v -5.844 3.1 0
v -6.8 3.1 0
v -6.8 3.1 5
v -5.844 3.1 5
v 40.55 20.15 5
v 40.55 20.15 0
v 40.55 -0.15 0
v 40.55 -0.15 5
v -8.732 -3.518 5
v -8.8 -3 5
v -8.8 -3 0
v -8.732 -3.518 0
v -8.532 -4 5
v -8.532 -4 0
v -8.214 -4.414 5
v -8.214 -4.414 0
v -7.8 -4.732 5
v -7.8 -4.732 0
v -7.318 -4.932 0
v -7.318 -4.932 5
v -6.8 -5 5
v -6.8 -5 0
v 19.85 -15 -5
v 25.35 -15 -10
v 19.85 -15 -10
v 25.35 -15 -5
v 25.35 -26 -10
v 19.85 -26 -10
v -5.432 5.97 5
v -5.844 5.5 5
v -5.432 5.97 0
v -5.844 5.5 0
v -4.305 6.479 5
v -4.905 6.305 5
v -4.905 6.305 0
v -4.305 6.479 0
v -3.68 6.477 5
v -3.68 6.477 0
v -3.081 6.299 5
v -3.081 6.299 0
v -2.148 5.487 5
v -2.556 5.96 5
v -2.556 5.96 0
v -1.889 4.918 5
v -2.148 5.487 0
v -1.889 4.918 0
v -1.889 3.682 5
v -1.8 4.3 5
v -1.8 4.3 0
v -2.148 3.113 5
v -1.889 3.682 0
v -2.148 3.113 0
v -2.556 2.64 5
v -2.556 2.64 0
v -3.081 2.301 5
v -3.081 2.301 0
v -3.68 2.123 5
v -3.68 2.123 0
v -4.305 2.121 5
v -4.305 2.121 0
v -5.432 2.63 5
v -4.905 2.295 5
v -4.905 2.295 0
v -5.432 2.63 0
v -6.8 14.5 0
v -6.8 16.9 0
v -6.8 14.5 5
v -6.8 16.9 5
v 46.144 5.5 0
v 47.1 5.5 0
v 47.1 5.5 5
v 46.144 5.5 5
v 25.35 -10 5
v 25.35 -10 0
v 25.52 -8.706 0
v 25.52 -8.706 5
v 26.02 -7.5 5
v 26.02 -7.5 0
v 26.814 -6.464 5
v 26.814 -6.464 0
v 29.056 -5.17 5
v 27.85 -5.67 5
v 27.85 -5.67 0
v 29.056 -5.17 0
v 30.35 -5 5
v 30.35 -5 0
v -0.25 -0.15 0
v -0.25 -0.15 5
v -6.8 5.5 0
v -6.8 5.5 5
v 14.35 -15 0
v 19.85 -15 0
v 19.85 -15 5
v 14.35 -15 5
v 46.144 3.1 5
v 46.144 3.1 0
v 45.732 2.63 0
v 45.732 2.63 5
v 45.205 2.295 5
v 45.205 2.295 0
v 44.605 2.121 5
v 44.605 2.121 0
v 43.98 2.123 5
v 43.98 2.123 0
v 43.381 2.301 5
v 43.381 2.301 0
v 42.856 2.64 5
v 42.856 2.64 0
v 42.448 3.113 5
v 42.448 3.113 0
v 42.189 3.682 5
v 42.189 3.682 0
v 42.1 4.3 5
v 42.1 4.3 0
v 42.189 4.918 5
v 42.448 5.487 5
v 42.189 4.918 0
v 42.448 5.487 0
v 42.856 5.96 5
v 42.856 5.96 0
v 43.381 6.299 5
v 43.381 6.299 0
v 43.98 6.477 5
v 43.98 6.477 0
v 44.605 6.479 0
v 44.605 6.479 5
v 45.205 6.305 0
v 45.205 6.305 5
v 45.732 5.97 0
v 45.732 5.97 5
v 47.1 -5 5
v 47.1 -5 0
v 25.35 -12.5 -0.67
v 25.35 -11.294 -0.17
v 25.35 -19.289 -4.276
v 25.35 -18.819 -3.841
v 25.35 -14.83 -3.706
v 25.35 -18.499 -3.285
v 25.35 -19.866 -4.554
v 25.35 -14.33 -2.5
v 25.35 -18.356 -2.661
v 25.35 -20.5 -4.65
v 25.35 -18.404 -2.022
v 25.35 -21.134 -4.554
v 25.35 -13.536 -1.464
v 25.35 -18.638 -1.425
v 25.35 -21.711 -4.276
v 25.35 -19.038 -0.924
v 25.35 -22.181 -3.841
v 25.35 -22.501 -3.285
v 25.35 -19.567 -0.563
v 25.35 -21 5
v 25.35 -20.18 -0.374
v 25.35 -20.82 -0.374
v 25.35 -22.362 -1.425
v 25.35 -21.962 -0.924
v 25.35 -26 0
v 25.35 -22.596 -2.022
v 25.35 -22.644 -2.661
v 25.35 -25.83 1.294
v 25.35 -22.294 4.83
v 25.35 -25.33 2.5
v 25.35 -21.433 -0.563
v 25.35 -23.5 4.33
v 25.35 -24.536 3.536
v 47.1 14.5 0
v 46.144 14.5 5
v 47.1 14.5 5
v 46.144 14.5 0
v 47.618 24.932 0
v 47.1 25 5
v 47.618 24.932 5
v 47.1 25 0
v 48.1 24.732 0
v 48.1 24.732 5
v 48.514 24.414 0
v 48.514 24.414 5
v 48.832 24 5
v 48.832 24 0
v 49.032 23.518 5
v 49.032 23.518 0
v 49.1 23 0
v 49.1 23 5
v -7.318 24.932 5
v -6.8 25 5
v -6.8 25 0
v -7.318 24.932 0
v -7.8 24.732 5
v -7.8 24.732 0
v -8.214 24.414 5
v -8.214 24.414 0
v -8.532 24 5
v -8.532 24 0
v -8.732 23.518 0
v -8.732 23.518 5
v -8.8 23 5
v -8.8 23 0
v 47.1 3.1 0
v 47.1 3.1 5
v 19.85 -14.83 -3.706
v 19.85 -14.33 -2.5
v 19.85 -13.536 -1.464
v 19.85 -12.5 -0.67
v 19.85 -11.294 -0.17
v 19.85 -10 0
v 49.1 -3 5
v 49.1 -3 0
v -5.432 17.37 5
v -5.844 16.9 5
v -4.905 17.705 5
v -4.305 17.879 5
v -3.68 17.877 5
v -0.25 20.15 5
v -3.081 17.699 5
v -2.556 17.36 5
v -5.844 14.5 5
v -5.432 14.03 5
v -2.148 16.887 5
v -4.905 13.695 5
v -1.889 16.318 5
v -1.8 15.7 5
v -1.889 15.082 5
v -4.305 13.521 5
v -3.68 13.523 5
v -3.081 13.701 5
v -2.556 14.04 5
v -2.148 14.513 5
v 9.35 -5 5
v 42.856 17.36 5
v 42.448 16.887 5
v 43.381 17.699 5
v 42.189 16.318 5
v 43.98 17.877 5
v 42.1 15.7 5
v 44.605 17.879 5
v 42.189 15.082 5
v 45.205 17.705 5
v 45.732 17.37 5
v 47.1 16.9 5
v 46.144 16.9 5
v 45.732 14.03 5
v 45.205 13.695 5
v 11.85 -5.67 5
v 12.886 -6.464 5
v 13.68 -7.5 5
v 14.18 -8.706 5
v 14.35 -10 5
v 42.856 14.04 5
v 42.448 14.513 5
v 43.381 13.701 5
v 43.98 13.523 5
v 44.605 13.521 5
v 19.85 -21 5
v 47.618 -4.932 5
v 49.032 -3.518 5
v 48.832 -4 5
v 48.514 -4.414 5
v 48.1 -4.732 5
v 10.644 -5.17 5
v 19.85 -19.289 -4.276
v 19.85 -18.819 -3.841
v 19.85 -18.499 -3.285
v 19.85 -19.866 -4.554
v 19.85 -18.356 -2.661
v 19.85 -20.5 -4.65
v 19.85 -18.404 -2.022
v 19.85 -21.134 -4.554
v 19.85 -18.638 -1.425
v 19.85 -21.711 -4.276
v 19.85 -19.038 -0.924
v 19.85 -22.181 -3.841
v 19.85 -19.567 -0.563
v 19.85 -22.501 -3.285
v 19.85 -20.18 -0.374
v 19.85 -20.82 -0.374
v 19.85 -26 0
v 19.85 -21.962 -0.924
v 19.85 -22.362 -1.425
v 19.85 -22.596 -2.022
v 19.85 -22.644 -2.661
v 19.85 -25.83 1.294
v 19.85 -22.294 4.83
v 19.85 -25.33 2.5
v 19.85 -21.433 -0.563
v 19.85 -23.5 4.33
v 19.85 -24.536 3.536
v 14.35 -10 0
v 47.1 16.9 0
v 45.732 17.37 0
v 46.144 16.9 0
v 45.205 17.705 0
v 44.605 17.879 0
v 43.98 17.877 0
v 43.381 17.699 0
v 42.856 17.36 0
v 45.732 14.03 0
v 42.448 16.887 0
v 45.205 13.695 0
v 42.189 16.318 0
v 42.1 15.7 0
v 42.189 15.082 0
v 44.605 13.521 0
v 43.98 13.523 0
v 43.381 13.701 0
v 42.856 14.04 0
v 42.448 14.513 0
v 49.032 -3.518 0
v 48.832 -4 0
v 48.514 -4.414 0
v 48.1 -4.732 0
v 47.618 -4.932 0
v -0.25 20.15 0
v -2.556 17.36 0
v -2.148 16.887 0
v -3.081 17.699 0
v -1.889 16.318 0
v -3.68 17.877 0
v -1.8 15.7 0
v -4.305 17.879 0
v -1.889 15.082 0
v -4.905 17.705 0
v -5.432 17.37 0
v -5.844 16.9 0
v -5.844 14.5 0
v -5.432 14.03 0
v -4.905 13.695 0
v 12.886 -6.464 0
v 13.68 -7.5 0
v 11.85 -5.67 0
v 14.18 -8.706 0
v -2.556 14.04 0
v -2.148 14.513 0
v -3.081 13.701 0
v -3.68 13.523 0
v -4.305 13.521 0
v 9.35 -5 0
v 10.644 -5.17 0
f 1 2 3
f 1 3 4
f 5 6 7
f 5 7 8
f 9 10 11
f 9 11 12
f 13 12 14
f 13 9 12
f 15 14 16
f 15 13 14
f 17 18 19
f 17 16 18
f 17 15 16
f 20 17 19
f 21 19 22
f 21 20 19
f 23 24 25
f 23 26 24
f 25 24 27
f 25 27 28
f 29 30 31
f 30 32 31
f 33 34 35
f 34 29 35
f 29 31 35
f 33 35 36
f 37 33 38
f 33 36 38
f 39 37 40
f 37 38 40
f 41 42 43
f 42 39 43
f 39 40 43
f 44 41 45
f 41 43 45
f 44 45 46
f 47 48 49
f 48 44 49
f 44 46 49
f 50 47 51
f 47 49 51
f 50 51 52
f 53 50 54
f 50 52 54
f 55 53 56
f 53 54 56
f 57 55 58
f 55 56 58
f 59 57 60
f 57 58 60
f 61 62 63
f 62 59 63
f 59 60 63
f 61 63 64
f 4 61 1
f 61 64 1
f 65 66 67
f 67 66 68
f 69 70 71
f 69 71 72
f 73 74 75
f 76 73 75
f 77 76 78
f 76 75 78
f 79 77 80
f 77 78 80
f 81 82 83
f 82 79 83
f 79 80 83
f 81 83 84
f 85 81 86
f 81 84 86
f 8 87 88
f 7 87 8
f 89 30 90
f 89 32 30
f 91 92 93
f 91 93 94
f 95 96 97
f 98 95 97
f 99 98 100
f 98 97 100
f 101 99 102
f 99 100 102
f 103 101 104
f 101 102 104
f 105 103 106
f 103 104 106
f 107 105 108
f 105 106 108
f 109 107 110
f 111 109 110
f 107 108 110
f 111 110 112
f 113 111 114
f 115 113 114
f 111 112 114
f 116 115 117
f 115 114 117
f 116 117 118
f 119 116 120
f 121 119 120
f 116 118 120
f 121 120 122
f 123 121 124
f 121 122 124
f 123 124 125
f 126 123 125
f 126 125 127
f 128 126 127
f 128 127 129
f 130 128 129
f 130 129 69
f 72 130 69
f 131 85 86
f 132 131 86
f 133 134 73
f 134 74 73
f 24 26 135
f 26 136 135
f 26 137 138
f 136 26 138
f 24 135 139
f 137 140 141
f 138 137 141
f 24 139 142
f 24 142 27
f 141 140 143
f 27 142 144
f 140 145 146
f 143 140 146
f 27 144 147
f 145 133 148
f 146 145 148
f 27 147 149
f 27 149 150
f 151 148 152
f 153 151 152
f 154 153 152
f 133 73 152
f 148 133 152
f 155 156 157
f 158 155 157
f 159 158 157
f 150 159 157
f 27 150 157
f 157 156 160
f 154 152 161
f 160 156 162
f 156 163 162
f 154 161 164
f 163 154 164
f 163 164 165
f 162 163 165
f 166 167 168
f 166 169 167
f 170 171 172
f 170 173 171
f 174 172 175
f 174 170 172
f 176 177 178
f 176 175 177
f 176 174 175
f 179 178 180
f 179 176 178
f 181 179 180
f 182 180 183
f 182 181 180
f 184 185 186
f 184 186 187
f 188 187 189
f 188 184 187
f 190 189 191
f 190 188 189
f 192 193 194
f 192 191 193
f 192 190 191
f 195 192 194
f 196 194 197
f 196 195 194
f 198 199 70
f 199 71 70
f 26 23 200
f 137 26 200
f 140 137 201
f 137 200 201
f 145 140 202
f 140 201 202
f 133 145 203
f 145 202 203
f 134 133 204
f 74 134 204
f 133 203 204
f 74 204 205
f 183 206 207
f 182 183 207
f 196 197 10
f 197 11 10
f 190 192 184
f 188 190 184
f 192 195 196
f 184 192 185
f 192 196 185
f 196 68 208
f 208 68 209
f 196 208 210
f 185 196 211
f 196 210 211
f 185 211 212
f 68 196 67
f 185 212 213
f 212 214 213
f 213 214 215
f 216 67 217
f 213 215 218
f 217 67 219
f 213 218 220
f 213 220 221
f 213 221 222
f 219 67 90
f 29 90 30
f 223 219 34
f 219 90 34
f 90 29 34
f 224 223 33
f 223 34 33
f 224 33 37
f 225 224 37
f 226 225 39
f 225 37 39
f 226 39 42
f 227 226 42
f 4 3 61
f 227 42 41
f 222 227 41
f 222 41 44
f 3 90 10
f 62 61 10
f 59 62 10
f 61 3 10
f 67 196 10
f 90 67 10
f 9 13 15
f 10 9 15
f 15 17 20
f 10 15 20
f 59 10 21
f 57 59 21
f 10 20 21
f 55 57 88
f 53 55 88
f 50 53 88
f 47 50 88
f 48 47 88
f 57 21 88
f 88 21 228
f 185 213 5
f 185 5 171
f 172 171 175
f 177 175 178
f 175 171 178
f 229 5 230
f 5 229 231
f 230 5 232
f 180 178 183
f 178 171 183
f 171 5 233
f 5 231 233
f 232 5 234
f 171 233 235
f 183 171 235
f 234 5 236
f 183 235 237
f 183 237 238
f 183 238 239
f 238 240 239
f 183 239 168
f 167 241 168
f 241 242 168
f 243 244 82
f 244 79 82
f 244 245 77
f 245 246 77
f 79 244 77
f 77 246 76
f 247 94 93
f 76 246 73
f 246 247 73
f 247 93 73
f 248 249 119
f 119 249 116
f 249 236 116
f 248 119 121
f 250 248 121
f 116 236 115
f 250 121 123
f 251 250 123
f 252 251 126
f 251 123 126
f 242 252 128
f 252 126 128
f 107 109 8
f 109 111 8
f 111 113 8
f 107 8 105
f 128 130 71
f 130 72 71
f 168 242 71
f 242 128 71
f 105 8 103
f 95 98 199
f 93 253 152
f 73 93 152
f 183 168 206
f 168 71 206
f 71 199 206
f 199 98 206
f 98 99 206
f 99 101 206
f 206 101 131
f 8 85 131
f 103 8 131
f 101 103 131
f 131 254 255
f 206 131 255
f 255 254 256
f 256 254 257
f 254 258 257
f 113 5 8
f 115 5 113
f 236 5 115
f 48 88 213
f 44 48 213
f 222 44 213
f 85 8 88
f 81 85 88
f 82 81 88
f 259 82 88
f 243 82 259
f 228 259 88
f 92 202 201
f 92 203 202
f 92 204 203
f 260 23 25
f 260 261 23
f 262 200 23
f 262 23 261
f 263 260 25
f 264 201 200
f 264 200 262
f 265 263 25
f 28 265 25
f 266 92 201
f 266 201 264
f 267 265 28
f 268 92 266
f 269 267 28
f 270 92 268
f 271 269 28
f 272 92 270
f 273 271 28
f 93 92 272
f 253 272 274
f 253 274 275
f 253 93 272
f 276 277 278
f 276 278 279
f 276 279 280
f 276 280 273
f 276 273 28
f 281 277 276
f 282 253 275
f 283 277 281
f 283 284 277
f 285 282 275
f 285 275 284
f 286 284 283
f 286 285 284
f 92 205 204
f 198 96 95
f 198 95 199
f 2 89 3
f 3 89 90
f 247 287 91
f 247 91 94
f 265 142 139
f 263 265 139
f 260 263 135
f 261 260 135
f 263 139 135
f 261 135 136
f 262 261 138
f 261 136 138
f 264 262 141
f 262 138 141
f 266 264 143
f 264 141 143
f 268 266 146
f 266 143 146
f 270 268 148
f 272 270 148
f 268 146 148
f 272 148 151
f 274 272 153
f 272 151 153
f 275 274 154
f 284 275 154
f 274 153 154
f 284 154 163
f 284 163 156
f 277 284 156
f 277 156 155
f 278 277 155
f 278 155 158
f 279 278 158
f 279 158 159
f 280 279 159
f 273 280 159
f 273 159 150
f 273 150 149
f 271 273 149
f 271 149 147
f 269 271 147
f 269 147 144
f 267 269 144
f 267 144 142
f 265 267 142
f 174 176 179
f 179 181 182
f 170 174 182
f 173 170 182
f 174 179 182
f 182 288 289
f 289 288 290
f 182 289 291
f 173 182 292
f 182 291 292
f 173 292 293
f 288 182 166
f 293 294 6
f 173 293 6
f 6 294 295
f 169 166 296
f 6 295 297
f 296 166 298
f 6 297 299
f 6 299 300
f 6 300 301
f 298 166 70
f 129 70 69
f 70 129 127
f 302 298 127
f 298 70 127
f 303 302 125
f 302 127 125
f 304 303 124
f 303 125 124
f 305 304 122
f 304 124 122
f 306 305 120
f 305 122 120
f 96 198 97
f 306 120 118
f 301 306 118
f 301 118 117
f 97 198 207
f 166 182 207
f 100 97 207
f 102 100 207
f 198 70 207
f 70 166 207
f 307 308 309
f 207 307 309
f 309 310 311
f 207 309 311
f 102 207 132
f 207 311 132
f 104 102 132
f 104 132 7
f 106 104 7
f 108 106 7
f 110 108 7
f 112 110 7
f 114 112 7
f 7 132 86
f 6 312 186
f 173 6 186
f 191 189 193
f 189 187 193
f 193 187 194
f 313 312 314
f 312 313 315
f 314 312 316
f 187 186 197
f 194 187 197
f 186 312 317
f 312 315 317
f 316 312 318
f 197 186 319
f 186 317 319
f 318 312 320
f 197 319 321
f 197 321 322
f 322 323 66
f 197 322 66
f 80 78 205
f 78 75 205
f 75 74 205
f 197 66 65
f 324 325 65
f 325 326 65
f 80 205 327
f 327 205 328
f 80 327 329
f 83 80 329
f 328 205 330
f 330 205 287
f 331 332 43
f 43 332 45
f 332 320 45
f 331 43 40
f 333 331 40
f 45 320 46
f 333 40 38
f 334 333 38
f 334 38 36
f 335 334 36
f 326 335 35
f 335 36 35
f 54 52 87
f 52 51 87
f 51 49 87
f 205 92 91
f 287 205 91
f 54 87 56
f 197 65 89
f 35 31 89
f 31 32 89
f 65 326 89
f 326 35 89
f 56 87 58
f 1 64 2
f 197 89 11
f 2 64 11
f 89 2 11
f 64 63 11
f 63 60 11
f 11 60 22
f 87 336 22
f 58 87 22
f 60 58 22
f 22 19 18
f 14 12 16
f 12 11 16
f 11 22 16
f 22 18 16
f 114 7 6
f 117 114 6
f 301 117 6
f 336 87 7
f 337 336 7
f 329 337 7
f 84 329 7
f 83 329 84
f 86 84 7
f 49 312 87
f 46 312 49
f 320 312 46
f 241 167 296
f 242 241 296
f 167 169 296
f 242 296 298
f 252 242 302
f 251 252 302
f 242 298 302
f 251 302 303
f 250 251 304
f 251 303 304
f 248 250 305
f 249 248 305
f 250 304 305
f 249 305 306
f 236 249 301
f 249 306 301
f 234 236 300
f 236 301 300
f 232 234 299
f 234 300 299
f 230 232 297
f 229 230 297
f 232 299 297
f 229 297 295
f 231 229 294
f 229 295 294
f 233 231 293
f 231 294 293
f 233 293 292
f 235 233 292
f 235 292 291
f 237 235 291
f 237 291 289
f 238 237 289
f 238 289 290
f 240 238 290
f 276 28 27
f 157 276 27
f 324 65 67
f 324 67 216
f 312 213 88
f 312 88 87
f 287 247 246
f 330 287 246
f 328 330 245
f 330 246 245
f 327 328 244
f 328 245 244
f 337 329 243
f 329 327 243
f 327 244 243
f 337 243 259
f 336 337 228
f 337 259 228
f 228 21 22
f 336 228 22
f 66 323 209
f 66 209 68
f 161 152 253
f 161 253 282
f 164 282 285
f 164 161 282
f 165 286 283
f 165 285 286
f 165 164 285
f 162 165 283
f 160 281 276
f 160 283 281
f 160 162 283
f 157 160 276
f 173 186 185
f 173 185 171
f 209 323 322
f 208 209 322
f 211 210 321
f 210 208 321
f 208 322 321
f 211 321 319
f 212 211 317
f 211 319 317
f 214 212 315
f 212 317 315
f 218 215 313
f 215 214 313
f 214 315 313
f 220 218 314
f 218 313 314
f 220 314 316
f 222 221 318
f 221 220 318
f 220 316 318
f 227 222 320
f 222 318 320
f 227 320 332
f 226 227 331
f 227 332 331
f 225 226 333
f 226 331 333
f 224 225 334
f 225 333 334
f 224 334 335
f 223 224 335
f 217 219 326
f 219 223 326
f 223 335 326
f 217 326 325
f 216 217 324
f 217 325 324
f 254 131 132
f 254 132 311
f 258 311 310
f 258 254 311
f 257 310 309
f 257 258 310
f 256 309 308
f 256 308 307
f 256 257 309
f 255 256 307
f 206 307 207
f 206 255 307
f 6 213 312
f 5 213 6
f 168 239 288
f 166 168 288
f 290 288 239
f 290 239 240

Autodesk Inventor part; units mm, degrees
ref_plane "YZ Plane" through (0, 0, 0) normal (1, 0, 0) x (0, 1, 0)
ref_plane "XZ Plane" through (0, 0, 0) normal (0, 1, 0) x (-1, 0, 0)
sketch "Sketch1" plane through (0, 0, 0) normal (0, 0, 1) x (1, 0, 0)
  line L0 (0, 0) -> (-6.8, 0)
  line L1 (-6.8, 0) -> (-6.8, 20)
  line L2 (-6.8, 20) -> (0, 20)
  line L3 (0, 20) -> (0, 0)
  line L4 (-5.8439, 5.5) -> (-6.8, 5.5) projected
  line L5 (-6.8, 14.5) -> (-6.8, 5.5) projected
  line L6 (-6.8, 14.5) -> (-5.8439, 14.5) projected
  arc A0 (-5.8439, 14.5) -> (-5.8439, 16.9) centre (-4, 15.7) ccw projected
  line L7 (-5.8439, 16.9) -> (-6.8, 16.9) projected
  line L8 (-6.8, 20) -> (-6.8, 16.9) projected
  line L9 (0, 20) -> (-6.8, 20) projected
  line L10 (0, 0) -> (0, 20) projected
  line L11 (0, 0) -> (-6.8, 0) projected
  line L12 (-6.8, 3.1) -> (-6.8, 0) projected
  line L13 (-6.8, 3.1) -> (-5.8439, 3.1) projected
  arc A1 (-5.8439, 3.1) -> (-5.8439, 5.5) centre (-4, 4.3) ccw projected
  dimension "d0" = 6.8
  dimension "d1" = 20
extrude "Extrusion1" add sketch "Sketch1" along normal blind 5 contours L0 L1 L13 A1 L4 L6 A0 L7 L2 L3
ref_plane "Work Plane1" through (20.15, 10, -1.65) normal (-1, 0, 0) x (0, 1, 0)
mirror "Mirror1" about plane through (20.15, 10, -1.65) normal (-1, 0, 0) of "Extrusion1"
sketch "Sketch2" plane through (-6.8, 0, 0) normal (0, -1, 0) x (1, 0, 0)
  line L0 (0, 0) -> (53.9, 0)
  line L1 (53.9, 0) -> (53.9, 5)
  line L2 (53.9, 5) -> (0, 5)
  line L3 (0, 5) -> (0, 0)
  dimension "d4" = 53.9
extrude "Extrusion2" add sketch "Sketch2" along normal blind 5
sketch "Sketch3" plane through (-6.8, 3.1, 0) normal (-1, 0, 0) x (0, 0, 1)
  line L0 (0, -8.1) -> (5, -8.1)
  line L1 (5, -8.1) -> (5, 16.9)
  line L2 (5, 16.9) -> (0, 16.9)
  line L3 (0, 16.9) -> (0, -8.1)
  point P0 (0, -3.1)
  dimension "d7" = 25
extrude "Extrusion3" add sketch "Sketch3" along normal blind 2
mirror "Mirror2" about plane through (20.15, 10, -1.65) normal (-1, 0, 0) of "Extrusion3"
fillet "Fillet1" radius 2 1 edges at (-8.8, -5, 2.5)
fillet "Fillet2" radius 2 1 edges at (49.1, -5, 2.5)
sketch "Sketch4" plane through (0, 20, 5) normal (1, 0, 0) x (0, 0, -1)
  line L0 (5, -20) -> (5, 0) projected
  line L1 (5, 0) -> (0, 0) projected
  line L2 (0, -20) -> (0, 0) projected
  line L3 (5, -20) -> (0, -20) projected
extrude "Extrusion4" cut sketch "Sketch4" against normal blind 0.25
mirror "Mirror3" about plane through (20.15, 10, -1.65) normal (-1, 0, 0) of "Extrusion4"
sketch "Sketch5" plane through (-8.8, 20, 5) normal (0, 1, 0) x (1, 0, 0)
  line L0 (0, 0) -> (57.9, 0)
  line L1 (57.9, 0) -> (57.9, 5)
  line L2 (57.9, 5) -> (0, 5)
  line L3 (0, 5) -> (0, 0)
  point P0 (8.8, 5)
  dimension "d14" = 57.9
extrude "Extrusion5" add sketch "Sketch5" along normal blind 5
sketch "Sketch6" plane through (-8.8, 20, 5) normal (0, -1, 0) x (1, 0, 0)
  line L0 (8.55, 0) -> (8.55, -5) projected
  line L1 (49.35, -5) -> (8.55, -5) projected
  line L2 (49.35, -5) -> (49.35, 0) projected
  line L3 (8.55, 0) -> (49.35, 0) projected
  point P0 (8.8, -5)
extrude "Extrusion6" cut sketch "Sketch6" against normal blind 0.15
sketch "Sketch7" plane through (-6.8, 0, 0) normal (0, 1, 0) x (1, 0, 0)
  line L0 (47.35, -5) -> (6.55, -5) projected
  line L1 (47.35, 0) -> (47.35, -5) projected
  line L2 (6.55, 0) -> (47.35, 0) projected
  line L3 (6.55, 0) -> (6.55, -5) projected
  point P0 (6.8, 0)
extrude "Extrusion7" cut sketch "Sketch7" against normal blind 0.15
sketch "Sketch9" plane through (-6.8, -5, 0) normal (0, -1, 0) x (1, 0, 0)
  line L0 (0, 5) -> (53.9, 5) projected
  line L1 (53.9, 0) -> (0, 0) projected
  line L2 (26.65, -10.0707) -> (26.65, 15.0707) construction
  line L3 (55.9, 0) -> (55.9, 5) construction
  line L4 (21.15, 5) -> (32.15, 5)
  line L5 (32.15, 5) -> (32.15, 0)
  line L6 (32.15, 0) -> (21.15, 0)
  line L7 (21.15, 0) -> (21.15, 5)
  point P0 (6.8, 0)
  dimension "d23" = 29.25
  dimension "d24" = 11
  dimension "d25" = 5.5
extrude "Extrusion9" add sketch "Sketch9" along normal blind 21
fillet "Fillet3" radius 5 2 edges at (14.35, -5, 2.5) (25.35, -5, 2.5)
sketch "Sketch10" plane through (0, 0, 0) normal (0, 0, -1) x (-1, 0, 0)
  line L0 (-47.1, -5) -> (-30.35, -5) projected
  line L1 (-14.35, -10) -> (-14.35, -26) projected
  line L2 (-25.35, -15) -> (-19.85, -15)
  line L3 (-19.85, -15) -> (-19.85, -26)
  line L4 (-19.85, -26) -> (-25.35, -26)
  line L5 (-25.35, -10) -> (-25.35, -26) projected
  line L6 (-9.35, -5) -> (6.8, -5) projected
  line L7 (-25.35, -15) -> (-25.35, -26)
  point P0 (0, 0)
  dimension "d30" = 11
  dimension "d31" = 10
  dimension "d32" = 5.5
extrude "Extrusion10" add sketch "Sketch10" along normal blind 10
fillet "Fillet7" radius 5 1 edges at (22.6, -15, 0)
sketch "Sketch11" plane through (0, 0, 0) normal (0, 0, -1) x (-1, 0, 0)
  line L0 (-19.85, -10) -> (-19.85, -26) projected
  line L1 (-14.35, -26) -> (-19.85, -26)
  line L2 (-19.85, -26) -> (-19.85, -15)
  line L3 (-19.85, -15) -> (-14.35, -15)
  line L4 (-14.35, -15) -> (-14.35, -26)
  point P0 (0, 0)
  dimension "d39" = 11
extrude "Extrusion11" cut sketch "Sketch11" against normal blind 10
sketch "Sketch12" plane through (25.35, -26, 5) normal (1, 0, 0) x (0, 0, -1)
  line L0 (15, 11) -> (15, 0) projected
  circle A0 centre (7.5, 5.5) radius 2.15
  point P0 (5, 26)
  dimension "d42" = 4.3
  dimension "d43" = 7.5
extrude "Extrusion12" cut sketch "Sketch12" against normal blind 10
fillet "Fillet8" radius 5 1 edges at (22.6, -26, 5)
sketch "Sketch14" plane through (20.15, 10, -1.65) normal (1, 0, 0) x (0, 1, 0)
  point P0 (-10, -1.65)
fillet "Fillet9" radius 2 2 edges at (49.1, 25, 2.5) (-8.8, 25, 2.5)
ref_plane "Work Plane2" through (20.15, 10, -1.65) normal (-1, 0, 0) x (0, 1, 0)
properties part number "TopBar"
